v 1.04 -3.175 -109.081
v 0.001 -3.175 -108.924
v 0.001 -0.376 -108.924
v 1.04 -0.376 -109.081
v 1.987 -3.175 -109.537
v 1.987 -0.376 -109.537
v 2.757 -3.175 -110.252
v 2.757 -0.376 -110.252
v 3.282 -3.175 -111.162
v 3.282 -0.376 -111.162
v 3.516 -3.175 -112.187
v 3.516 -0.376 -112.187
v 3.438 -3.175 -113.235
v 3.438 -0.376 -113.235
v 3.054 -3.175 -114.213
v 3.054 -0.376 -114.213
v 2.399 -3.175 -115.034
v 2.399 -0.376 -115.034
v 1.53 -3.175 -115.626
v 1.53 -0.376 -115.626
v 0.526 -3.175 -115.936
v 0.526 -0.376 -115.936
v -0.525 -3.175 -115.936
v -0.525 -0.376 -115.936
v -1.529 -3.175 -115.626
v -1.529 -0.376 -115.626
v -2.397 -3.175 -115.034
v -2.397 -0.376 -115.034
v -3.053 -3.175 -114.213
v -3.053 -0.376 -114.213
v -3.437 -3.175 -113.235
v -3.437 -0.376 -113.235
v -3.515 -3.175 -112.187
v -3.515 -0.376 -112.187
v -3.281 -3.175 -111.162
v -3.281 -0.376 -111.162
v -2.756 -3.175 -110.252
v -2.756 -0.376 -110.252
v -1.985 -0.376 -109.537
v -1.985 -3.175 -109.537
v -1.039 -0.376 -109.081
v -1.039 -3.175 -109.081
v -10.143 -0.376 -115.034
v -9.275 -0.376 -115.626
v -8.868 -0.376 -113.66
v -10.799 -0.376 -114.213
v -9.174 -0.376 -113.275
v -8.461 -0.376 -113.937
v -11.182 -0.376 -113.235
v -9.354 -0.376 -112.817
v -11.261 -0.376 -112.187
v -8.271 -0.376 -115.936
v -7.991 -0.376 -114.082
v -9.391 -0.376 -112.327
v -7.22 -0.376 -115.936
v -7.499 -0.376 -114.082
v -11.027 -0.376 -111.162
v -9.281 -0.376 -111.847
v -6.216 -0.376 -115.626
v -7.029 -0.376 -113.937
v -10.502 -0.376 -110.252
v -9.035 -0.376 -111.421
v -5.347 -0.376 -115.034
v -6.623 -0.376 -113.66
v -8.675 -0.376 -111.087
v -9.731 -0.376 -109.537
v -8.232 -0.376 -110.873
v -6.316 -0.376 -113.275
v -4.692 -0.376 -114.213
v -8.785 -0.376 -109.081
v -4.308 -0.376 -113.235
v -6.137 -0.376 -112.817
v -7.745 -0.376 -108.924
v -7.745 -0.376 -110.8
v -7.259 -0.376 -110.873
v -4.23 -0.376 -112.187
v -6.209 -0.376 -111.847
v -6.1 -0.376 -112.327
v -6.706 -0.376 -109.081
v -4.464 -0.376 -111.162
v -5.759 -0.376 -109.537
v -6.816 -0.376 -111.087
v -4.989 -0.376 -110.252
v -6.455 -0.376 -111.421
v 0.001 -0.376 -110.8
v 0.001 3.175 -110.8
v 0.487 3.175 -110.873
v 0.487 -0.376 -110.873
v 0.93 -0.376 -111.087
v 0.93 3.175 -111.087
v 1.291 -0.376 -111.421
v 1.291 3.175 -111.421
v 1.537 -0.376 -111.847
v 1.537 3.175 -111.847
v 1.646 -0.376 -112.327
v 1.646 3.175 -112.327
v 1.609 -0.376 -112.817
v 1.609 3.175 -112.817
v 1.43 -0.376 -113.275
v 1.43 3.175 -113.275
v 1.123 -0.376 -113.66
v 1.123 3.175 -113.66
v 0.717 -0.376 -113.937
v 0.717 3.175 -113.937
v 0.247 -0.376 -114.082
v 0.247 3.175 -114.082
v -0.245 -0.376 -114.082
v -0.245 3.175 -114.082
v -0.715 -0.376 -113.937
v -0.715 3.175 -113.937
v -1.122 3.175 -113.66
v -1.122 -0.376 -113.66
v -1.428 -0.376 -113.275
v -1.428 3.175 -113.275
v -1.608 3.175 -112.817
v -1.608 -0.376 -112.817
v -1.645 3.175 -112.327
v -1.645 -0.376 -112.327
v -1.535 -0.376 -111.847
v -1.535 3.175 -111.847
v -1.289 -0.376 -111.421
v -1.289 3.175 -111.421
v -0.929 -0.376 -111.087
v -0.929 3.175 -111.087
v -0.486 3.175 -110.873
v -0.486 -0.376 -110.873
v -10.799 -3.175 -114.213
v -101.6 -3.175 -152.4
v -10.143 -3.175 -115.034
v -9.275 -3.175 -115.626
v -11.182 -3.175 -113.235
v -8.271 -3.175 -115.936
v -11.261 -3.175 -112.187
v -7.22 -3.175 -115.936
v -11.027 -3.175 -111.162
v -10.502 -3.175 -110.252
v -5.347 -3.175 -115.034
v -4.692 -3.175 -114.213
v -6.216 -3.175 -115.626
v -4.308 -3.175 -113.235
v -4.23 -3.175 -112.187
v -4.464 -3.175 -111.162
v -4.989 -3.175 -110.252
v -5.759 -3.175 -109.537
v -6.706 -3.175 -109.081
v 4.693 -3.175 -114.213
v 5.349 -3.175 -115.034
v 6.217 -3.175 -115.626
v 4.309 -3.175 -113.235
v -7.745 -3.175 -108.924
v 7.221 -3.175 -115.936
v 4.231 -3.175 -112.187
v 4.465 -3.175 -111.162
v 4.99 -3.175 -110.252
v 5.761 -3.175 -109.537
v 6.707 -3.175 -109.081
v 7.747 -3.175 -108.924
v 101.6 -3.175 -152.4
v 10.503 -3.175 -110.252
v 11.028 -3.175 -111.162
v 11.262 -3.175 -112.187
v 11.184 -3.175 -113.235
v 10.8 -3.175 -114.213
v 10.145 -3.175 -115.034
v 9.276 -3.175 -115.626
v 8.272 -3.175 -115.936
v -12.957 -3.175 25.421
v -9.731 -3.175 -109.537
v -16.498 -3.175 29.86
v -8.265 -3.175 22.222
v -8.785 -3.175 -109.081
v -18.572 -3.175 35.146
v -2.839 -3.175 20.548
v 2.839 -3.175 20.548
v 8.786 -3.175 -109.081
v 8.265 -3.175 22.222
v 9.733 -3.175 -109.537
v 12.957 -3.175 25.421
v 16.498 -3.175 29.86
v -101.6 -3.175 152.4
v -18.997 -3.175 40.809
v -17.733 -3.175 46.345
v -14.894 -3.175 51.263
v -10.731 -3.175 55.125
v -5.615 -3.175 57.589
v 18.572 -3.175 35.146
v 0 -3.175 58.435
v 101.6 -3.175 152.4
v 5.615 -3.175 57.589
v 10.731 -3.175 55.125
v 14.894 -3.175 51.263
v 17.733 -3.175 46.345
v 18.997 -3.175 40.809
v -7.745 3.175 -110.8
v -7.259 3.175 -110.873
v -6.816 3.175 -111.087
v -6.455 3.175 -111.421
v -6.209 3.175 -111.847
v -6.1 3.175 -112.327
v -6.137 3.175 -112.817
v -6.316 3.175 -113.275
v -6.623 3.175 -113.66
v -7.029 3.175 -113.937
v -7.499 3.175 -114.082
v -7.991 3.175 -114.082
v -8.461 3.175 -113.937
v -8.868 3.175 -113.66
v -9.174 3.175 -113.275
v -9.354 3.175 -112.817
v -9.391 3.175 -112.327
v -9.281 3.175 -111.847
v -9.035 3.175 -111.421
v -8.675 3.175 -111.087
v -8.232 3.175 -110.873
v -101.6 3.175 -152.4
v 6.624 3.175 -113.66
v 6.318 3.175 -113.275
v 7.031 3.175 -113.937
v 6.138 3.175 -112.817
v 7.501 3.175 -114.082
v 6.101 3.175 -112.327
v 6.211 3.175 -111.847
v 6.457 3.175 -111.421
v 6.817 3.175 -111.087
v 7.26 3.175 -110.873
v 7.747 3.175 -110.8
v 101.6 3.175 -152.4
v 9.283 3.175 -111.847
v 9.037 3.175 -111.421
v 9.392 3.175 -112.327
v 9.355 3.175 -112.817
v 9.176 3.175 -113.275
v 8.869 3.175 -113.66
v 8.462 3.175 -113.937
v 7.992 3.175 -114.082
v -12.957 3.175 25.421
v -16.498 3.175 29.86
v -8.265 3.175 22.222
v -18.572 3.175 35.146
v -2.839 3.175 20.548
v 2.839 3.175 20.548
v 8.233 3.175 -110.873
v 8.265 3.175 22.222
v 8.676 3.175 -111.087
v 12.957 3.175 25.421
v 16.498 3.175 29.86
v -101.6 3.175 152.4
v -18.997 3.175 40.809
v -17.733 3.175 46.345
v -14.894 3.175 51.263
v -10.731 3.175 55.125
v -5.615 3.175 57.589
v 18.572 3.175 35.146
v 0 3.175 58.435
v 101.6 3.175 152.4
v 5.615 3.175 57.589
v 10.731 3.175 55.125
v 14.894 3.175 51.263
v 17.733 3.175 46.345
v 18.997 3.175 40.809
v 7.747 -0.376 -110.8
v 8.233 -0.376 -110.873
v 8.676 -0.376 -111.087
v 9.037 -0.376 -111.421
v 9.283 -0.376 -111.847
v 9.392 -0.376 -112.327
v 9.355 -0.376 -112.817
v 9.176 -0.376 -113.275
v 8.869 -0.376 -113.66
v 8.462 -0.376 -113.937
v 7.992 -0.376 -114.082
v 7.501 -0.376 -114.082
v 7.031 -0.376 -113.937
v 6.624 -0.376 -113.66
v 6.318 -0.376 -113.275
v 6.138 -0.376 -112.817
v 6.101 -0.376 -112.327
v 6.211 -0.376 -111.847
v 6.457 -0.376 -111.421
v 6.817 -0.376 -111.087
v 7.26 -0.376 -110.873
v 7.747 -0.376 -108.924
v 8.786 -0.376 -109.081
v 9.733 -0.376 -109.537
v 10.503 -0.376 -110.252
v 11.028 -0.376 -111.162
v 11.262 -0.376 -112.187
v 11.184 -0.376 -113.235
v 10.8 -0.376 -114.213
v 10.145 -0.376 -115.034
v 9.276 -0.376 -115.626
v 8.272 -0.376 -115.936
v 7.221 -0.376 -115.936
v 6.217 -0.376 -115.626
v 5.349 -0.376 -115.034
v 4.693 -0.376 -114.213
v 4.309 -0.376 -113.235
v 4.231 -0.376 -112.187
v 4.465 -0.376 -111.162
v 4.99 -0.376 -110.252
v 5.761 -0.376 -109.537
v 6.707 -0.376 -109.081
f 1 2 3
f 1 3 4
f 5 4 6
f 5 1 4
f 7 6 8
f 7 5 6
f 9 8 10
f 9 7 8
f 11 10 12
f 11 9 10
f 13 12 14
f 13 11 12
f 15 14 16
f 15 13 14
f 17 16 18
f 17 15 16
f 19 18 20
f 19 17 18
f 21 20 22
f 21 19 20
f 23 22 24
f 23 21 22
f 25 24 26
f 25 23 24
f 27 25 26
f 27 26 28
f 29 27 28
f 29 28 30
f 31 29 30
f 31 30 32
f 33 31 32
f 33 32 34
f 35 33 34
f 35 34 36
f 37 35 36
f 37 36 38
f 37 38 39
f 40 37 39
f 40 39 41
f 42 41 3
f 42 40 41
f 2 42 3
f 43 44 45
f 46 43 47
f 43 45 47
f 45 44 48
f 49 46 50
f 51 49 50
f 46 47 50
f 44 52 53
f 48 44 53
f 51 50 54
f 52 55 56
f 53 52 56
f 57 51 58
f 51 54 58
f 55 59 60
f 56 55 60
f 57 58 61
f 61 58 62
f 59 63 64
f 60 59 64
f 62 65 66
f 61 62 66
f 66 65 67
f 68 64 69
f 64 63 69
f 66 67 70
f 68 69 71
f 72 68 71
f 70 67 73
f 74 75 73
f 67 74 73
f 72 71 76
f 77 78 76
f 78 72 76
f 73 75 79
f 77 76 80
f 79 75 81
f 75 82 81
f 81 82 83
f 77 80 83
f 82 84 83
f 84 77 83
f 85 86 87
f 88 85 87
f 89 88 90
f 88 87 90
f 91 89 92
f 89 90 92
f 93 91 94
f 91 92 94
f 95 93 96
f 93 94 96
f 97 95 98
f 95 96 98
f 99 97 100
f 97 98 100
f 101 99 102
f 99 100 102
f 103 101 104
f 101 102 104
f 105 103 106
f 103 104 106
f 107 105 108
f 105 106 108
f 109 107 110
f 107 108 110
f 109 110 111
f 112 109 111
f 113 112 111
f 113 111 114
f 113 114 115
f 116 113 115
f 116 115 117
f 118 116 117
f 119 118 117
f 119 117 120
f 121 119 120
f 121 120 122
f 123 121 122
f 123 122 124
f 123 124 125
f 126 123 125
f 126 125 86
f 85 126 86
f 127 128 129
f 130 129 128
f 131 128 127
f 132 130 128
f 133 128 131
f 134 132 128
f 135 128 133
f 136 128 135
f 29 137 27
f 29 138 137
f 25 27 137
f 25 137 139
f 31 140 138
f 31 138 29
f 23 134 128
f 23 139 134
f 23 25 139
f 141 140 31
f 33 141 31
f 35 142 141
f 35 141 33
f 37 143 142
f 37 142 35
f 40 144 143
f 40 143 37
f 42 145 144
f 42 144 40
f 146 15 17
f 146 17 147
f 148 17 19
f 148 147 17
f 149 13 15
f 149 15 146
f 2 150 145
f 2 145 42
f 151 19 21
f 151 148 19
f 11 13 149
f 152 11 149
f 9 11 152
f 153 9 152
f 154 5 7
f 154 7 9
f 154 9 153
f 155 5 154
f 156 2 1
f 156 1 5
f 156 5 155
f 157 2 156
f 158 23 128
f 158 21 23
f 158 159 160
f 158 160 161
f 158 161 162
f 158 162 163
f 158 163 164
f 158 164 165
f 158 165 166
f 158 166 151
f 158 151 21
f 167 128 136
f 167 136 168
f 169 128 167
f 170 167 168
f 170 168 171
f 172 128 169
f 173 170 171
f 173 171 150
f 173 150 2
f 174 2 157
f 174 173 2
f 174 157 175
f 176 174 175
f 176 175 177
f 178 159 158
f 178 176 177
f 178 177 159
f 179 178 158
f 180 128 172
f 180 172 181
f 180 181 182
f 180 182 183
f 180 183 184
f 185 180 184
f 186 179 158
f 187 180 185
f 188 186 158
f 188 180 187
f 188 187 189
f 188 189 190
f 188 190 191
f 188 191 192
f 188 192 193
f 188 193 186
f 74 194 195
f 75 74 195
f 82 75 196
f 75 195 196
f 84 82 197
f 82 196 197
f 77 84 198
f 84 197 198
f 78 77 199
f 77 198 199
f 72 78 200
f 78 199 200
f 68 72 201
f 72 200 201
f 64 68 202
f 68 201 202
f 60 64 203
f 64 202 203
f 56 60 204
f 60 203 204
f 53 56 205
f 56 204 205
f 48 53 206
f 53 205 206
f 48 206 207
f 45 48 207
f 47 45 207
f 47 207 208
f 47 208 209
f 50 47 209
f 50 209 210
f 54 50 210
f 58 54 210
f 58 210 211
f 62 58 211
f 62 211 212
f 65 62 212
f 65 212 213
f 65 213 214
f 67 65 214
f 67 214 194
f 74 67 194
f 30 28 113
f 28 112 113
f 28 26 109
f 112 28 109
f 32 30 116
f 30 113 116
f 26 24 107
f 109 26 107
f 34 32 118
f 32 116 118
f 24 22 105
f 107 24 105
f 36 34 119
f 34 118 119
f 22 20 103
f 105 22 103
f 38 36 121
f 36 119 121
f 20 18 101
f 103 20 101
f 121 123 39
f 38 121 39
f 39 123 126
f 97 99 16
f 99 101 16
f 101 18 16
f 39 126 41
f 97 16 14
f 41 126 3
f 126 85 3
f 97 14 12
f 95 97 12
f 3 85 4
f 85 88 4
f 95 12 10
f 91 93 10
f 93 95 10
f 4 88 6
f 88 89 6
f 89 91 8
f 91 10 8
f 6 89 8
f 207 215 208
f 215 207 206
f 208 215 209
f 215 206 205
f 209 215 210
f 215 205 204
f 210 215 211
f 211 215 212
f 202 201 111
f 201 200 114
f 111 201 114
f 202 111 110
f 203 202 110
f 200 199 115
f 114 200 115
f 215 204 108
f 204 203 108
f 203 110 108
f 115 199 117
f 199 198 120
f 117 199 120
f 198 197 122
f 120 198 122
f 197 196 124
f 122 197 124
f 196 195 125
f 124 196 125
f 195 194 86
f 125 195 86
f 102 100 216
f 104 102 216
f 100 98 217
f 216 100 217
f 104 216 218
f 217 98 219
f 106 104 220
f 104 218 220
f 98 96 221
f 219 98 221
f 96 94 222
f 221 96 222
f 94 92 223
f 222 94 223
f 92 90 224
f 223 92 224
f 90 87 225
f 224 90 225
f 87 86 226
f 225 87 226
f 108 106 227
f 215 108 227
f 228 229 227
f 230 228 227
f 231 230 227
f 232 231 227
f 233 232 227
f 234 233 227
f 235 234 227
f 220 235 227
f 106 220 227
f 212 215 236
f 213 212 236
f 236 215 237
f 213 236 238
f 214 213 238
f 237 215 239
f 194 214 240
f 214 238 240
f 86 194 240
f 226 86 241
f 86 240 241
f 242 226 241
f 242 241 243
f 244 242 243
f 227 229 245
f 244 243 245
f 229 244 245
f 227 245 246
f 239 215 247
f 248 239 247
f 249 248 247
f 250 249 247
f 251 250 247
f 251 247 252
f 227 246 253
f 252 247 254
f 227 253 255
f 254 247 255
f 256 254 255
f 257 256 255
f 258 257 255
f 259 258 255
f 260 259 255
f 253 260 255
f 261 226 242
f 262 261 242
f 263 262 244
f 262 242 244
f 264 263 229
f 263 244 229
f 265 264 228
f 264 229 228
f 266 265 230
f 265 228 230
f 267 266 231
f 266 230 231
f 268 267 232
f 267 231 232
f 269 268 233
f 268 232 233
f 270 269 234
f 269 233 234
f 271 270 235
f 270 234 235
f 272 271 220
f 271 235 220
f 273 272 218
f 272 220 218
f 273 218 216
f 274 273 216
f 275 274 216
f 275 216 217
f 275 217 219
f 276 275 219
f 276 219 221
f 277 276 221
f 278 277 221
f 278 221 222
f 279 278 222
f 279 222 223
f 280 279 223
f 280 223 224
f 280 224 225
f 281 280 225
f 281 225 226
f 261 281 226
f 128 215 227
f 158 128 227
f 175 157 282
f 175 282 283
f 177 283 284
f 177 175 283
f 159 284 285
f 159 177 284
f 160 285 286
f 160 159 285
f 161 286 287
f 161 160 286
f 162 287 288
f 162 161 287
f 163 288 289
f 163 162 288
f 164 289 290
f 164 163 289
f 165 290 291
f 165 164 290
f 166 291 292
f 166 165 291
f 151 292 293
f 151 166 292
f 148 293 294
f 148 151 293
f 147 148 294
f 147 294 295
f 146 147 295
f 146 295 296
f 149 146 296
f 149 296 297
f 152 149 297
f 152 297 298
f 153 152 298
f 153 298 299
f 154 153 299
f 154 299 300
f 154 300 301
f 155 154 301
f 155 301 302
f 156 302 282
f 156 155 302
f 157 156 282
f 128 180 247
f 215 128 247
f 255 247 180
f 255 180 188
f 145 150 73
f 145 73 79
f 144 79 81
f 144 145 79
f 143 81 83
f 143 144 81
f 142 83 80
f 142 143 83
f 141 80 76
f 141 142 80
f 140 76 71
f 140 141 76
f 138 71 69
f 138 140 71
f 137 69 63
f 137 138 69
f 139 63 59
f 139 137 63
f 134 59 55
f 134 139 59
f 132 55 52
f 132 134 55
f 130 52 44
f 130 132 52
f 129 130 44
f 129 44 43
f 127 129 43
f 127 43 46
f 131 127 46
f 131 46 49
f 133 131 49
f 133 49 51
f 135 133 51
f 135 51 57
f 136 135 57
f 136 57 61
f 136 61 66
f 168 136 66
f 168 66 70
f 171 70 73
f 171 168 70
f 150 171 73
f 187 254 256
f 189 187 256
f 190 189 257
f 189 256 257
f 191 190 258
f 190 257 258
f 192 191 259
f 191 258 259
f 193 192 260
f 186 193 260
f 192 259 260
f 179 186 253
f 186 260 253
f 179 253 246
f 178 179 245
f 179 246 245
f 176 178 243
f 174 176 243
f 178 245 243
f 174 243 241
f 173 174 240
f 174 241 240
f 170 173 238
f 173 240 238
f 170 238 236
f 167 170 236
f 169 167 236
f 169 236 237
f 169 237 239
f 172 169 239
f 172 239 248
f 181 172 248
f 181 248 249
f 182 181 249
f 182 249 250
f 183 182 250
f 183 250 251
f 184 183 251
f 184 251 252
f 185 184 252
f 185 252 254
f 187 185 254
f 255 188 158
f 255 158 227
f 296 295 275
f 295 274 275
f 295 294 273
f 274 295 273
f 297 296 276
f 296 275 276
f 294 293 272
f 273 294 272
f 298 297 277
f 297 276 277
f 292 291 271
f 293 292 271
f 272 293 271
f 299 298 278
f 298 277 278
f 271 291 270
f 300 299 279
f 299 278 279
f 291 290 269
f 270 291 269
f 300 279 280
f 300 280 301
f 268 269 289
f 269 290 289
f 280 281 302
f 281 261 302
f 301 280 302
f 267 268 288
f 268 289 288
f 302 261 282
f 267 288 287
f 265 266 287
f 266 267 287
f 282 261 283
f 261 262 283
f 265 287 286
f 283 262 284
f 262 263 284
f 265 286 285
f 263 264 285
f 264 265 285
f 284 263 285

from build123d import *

# Parameters (mm, degrees)
SKETCH3_W           = 203.2
SKETCH3_H           = 6.35
BOSS_EXTRUDE1_DEPTH = 152.4
SKETCH5_R           = 1.65
SKETCH5_R_2         = 1.650000002
CUT_EXTRUDE1_DEPTH  = 25400
SKETCH7_R           = 3.52552
CUT_EXTRUDE2_DEPTH  = 2.79908
SKETCH8_R           = 19.05
CUT_EXTRUDE3_DEPTH  = 184.272045059


with BuildPart() as part:
    # Sketch3 → Boss-Extrude1 (new, symmetric)
    with BuildSketch(Plane.XY):
        Rectangle(SKETCH3_W, SKETCH3_H)
    extrude(amount=BOSS_EXTRUDE1_DEPTH, both=True)

    # Sketch5 → Cut-Extrude1 (cut)
    with BuildSketch(Plane(origin=(0, 3.175, 0), x_dir=(1, 0, 0), z_dir=(0, 1, 0))):
        with Locations(Location((7.746566692, 112.45, 0), (0, 0, 270))):
            Circle(SKETCH5_R)
        with Locations(Location((-7.745366692, 112.45, 0), (0, 0, 270))):
            Circle(SKETCH5_R_2)
        with Locations(Location((0.0006, 112.45, 0), (0, 0, 270))):
            Circle(SKETCH5_R)
    extrude(amount=-CUT_EXTRUDE1_DEPTH, mode=Mode.SUBTRACT)

    # Sketch7 → Cut-Extrude2 (cut)
    with BuildSketch(Plane(origin=(0, -3.175, 0), x_dir=(1, 0, 0), z_dir=(0, 1, 0))):
        with Locations(Location((7.746566692, 112.45, 0), (0, 0, 270))):
            Circle(SKETCH7_R)
        with Locations(Location((0.0006, 112.45, 0), (0, 0, 270))):
            Circle(SKETCH7_R)
        with Locations(Location((-7.745366692, 112.45, 0), (0, 0, 270))):
            Circle(SKETCH7_R)
    extrude(amount=CUT_EXTRUDE2_DEPTH, mode=Mode.SUBTRACT)

    # Sketch8 → Cut-Extrude3 (cut, through all)
    with BuildSketch(Plane(origin=(0, 3.175, 0), x_dir=(1, 0, 0), z_dir=(0, 1, 0))):
        with Locations(Location((0, -39.38524, 0), (0, 0, 270))):
            Circle(SKETCH8_R)
    extrude(amount=-CUT_EXTRUDE3_DEPTH, mode=Mode.SUBTRACT)


solid = part.part
